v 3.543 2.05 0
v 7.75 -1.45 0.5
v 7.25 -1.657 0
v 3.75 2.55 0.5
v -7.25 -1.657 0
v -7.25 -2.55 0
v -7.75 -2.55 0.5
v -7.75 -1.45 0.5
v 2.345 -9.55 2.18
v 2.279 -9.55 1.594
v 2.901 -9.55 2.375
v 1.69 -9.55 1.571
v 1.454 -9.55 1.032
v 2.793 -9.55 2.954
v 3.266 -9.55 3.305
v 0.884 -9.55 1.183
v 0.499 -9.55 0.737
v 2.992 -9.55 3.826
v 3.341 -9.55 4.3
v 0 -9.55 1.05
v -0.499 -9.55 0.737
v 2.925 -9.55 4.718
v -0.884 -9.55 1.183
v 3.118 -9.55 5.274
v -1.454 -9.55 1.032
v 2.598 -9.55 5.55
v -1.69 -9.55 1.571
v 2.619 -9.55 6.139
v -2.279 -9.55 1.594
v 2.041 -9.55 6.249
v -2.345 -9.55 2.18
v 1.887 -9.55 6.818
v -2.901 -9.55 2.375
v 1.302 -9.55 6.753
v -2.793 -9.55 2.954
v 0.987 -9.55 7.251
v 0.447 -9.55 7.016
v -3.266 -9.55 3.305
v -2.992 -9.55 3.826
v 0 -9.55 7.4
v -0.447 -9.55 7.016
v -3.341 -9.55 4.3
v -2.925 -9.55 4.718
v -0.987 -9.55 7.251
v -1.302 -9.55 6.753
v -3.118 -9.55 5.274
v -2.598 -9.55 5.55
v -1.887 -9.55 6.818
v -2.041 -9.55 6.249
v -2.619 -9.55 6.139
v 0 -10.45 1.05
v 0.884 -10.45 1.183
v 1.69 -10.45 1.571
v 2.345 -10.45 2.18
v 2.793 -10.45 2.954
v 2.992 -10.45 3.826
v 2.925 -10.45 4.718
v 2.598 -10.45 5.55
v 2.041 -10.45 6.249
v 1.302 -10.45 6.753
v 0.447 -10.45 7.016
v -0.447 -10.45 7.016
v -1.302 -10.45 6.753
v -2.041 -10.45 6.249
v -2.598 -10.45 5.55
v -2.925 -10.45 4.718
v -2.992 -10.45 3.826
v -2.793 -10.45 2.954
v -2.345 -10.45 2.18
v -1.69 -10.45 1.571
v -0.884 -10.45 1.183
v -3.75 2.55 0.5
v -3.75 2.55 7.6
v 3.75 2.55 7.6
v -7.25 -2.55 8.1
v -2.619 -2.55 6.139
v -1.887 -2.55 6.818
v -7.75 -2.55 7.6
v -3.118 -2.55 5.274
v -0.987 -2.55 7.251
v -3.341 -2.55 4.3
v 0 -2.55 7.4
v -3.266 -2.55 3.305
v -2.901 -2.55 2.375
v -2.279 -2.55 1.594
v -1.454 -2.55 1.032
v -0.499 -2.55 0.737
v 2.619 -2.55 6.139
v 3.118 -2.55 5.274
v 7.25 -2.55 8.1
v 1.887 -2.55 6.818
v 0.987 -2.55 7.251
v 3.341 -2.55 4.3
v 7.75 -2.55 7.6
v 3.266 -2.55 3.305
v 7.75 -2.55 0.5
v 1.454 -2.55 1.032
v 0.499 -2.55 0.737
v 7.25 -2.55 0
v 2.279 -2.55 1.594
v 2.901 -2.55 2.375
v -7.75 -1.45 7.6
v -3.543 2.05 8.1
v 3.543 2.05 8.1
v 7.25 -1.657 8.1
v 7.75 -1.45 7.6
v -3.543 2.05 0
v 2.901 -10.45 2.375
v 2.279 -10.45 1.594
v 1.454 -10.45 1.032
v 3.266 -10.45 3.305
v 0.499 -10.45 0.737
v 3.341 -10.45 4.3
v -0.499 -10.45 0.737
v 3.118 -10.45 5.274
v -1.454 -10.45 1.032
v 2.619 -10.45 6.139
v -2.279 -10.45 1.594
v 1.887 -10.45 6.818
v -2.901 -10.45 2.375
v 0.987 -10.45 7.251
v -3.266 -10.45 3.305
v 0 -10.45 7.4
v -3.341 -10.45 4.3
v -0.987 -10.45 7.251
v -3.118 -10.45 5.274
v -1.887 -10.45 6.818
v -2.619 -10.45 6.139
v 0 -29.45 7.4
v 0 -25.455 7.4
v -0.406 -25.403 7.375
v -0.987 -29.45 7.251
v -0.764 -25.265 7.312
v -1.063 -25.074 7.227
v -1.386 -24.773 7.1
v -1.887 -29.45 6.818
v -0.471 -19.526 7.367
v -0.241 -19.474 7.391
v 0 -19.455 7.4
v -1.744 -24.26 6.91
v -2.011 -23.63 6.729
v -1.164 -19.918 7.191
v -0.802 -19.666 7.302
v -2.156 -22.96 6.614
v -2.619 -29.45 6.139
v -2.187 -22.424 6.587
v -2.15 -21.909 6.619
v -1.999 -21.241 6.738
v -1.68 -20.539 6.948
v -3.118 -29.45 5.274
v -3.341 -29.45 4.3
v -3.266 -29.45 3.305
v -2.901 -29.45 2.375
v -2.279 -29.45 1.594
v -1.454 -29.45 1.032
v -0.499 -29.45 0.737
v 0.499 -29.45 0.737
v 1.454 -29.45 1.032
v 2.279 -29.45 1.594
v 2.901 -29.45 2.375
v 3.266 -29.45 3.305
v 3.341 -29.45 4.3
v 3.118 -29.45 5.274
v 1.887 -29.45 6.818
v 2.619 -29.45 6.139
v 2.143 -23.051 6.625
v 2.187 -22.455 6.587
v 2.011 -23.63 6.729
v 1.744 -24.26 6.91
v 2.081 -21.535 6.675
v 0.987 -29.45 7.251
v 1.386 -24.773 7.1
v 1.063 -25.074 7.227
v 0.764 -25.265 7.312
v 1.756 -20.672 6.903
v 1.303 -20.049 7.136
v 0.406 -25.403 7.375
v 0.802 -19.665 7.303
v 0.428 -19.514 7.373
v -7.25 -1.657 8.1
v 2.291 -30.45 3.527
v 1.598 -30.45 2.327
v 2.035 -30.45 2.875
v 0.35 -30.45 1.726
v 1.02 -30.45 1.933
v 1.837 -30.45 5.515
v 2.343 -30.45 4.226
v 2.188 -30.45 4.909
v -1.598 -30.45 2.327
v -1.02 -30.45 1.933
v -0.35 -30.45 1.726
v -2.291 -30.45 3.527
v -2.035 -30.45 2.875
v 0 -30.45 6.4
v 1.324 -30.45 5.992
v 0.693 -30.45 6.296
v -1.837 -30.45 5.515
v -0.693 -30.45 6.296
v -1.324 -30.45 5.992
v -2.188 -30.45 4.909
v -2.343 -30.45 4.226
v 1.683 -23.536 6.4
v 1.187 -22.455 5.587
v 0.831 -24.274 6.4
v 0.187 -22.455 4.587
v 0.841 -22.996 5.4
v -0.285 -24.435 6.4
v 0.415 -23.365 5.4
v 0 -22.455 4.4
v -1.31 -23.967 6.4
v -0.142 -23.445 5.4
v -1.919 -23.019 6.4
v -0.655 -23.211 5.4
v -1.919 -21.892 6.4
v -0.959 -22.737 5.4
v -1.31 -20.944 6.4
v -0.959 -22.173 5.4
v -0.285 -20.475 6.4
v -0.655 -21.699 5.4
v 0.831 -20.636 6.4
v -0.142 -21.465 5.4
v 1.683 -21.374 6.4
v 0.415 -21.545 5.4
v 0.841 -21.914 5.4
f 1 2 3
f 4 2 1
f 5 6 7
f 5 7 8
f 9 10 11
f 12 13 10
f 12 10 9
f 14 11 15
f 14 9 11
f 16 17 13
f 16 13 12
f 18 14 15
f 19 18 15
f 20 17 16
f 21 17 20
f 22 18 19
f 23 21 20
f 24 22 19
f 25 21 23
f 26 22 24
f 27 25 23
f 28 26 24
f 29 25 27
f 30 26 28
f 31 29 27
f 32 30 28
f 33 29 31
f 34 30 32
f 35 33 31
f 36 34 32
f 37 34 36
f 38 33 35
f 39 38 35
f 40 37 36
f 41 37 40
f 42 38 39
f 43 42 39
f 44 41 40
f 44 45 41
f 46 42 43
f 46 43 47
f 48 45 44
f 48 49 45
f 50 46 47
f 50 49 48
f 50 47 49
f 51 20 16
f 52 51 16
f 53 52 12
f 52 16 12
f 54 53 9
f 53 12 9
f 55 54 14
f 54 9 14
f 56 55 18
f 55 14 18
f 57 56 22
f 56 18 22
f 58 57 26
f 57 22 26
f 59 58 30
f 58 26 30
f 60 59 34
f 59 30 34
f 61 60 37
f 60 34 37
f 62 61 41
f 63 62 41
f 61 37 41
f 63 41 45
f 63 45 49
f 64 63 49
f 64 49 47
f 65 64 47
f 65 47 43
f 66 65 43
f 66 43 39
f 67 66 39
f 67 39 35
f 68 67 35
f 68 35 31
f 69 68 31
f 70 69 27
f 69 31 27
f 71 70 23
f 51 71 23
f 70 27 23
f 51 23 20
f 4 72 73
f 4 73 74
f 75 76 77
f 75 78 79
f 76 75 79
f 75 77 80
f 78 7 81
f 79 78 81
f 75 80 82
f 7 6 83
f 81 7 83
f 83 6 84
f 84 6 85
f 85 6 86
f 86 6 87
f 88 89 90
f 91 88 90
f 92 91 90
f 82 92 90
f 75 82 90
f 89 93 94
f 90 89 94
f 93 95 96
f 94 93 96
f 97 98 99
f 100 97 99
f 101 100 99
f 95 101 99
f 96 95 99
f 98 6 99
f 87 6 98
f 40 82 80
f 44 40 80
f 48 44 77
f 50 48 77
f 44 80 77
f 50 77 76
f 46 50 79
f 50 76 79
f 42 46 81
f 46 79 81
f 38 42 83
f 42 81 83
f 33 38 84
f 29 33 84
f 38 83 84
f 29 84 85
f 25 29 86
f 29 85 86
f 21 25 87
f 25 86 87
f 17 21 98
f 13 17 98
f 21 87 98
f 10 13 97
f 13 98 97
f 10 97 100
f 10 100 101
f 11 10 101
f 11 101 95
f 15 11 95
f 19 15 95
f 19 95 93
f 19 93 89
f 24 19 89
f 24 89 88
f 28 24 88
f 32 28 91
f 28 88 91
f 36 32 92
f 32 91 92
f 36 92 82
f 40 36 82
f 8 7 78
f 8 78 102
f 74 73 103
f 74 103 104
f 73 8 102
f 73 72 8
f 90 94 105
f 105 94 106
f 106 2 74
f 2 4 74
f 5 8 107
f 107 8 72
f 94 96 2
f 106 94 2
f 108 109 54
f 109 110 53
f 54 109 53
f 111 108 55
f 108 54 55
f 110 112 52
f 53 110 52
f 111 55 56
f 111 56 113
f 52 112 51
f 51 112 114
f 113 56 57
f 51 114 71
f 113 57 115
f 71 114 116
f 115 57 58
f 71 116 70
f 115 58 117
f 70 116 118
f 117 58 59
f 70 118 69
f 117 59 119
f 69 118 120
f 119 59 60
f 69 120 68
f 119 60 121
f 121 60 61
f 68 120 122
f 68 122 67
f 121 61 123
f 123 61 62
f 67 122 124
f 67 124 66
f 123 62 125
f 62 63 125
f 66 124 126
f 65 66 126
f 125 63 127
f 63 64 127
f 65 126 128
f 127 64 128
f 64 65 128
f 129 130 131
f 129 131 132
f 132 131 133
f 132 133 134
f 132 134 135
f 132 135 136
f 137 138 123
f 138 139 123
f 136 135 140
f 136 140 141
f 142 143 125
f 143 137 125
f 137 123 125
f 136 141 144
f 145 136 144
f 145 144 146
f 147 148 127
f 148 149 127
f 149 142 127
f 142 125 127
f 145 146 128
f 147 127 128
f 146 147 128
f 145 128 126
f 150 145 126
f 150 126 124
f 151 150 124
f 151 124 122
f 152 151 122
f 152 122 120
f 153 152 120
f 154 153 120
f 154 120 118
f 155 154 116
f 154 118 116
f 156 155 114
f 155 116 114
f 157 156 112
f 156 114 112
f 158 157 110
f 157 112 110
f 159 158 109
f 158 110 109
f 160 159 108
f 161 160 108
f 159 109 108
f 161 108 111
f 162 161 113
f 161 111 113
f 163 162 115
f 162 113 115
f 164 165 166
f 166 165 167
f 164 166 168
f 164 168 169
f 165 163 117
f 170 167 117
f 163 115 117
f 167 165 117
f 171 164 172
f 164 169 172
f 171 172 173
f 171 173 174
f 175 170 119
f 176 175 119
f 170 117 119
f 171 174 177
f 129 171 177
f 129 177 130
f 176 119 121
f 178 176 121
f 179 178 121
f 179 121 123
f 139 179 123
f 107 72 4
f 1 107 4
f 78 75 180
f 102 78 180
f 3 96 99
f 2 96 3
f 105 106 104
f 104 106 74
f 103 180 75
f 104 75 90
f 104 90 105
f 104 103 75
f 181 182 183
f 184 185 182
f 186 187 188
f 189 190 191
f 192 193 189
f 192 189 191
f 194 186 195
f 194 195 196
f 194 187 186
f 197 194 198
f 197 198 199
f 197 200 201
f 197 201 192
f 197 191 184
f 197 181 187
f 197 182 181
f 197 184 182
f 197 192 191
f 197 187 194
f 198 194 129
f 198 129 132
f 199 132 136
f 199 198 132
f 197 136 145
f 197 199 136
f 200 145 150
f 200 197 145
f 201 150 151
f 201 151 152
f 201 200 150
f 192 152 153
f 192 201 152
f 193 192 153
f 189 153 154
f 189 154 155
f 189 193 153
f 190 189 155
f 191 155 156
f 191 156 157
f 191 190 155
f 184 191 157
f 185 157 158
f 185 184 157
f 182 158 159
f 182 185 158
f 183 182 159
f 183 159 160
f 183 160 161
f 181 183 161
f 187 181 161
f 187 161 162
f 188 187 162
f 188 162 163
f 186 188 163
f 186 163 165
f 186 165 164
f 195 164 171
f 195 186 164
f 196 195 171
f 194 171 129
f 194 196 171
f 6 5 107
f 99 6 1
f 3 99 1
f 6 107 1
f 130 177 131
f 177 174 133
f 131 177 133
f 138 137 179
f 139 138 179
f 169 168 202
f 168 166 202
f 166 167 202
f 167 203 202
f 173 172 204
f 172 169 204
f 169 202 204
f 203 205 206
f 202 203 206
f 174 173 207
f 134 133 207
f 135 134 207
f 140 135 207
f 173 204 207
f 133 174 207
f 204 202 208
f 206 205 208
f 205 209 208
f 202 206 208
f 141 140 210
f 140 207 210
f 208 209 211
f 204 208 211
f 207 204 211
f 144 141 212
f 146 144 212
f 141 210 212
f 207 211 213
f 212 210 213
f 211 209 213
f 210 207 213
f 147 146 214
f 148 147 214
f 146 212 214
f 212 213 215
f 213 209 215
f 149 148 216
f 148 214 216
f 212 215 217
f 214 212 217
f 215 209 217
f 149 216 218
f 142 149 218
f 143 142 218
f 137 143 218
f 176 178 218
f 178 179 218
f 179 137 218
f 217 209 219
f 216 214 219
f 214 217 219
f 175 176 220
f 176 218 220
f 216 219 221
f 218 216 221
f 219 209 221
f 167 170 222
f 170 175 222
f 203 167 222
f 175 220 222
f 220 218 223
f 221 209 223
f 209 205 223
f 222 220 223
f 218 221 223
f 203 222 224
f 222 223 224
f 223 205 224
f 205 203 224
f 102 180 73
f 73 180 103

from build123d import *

# Parameters (mm, degrees)
SKETCH_1_W      = 15.5
SKETCH_1_H      = 5.1
EXTRUDE_1_DEPTH = 8.1
CHAMFER_1_SIZE  = 4
CHAMFER_2_SIZE  = 0.5
SKETCH_2_R      = 3.35
EXTRUDE_2_DEPTH = 7
SKETCH_3_R      = 3
EXTRUDE_3_DEPTH = 0.9
SKETCH_5_R      = 3.35
EXTRUDE_4_DEPTH = 20
CHAMFER_3_SIZE  = 1


with BuildPart() as part:
    # 草图1 → 凸台-拉伸1 (new body)
    with BuildSketch(Plane.XY):
        Rectangle(SKETCH_1_W, SKETCH_1_H)
    extrude(amount=EXTRUDE_1_DEPTH)

    # 倒角1
    chamfer_1_edges = [part.edges().sort_by_distance(p)[0] for p in [
        (-7.75, 2.55, 4.05),
        (7.75, 2.55, 4.05),
    ]]
    chamfer(chamfer_1_edges, length=CHAMFER_1_SIZE)

    # 倒角2
    chamfer_2_edges = [part.edges().sort_by_distance(p)[0] for p in [
        (0, 2.55, 0),
        (0, 2.55, 8.1),
        (-7.75, -2, 0),
        (-5.75, 0.55, 0),
        (5.75, 0.55, 0),
        (-7.75, -2, 8.1),
        (-5.75, 0.55, 8.1),
        (5.75, 0.55, 8.1),
        (7.75, -2, 8.1),
        (7.75, -2, 0),
    ]]
    chamfer(chamfer_2_edges, length=CHAMFER_2_SIZE)

    # 草图2 → 凸台-拉伸2 (add)
    with BuildSketch(Plane.XZ.offset(2.55)):
        with Locations(Location((0, 4.05, 0), (0, 0, 90))):
            Circle(SKETCH_2_R)
    extrude(amount=EXTRUDE_2_DEPTH)

    # 草图3 → 凸台-拉伸3 (add)
    with BuildSketch(Plane.XZ.offset(9.55)):
        with Locations(Location((0, 4.05, 0), (0, 0, 270))):
            Circle(SKETCH_3_R)
    extrude(amount=EXTRUDE_3_DEPTH)

    # 草图5 → 凸台-拉伸4 (add)
    with BuildSketch(Plane.XZ.offset(10.45)):
        with Locations(Location((0, 4.05, 0), (0, 0, 90))):
            Circle(SKETCH_5_R)
    extrude(amount=EXTRUDE_4_DEPTH)

    # 倒角3
    chamfer_3_edges = [part.edges().sort_by_distance(p)[0] for p in [
        (0, -30.45, 0.7),
    ]]
    chamfer(chamfer_3_edges, length=CHAMFER_3_SIZE)

    # 草图6 → 切除-旋转1 (revolve, cut)
    with BuildSketch(Plane(origin=(0, 0, 0), x_dir=(0, 0, -1), z_dir=(1, 0, 0)), mode=Mode.PRIVATE) as cut_revolve_1_sk:
        Polygon((-7.4, -22.455131571), (-7.4, -19.455131571), (-4.4, -22.455131571), align=None)
    revolve(cut_revolve_1_sk.sketch.rotate(Axis((0, -22.455131571, 7.4), (0, 0, -1)), 90), axis=Axis((0, -22.455131571, 7.4), (0, 0, -1)), mode=Mode.SUBTRACT)


solid = part.part
